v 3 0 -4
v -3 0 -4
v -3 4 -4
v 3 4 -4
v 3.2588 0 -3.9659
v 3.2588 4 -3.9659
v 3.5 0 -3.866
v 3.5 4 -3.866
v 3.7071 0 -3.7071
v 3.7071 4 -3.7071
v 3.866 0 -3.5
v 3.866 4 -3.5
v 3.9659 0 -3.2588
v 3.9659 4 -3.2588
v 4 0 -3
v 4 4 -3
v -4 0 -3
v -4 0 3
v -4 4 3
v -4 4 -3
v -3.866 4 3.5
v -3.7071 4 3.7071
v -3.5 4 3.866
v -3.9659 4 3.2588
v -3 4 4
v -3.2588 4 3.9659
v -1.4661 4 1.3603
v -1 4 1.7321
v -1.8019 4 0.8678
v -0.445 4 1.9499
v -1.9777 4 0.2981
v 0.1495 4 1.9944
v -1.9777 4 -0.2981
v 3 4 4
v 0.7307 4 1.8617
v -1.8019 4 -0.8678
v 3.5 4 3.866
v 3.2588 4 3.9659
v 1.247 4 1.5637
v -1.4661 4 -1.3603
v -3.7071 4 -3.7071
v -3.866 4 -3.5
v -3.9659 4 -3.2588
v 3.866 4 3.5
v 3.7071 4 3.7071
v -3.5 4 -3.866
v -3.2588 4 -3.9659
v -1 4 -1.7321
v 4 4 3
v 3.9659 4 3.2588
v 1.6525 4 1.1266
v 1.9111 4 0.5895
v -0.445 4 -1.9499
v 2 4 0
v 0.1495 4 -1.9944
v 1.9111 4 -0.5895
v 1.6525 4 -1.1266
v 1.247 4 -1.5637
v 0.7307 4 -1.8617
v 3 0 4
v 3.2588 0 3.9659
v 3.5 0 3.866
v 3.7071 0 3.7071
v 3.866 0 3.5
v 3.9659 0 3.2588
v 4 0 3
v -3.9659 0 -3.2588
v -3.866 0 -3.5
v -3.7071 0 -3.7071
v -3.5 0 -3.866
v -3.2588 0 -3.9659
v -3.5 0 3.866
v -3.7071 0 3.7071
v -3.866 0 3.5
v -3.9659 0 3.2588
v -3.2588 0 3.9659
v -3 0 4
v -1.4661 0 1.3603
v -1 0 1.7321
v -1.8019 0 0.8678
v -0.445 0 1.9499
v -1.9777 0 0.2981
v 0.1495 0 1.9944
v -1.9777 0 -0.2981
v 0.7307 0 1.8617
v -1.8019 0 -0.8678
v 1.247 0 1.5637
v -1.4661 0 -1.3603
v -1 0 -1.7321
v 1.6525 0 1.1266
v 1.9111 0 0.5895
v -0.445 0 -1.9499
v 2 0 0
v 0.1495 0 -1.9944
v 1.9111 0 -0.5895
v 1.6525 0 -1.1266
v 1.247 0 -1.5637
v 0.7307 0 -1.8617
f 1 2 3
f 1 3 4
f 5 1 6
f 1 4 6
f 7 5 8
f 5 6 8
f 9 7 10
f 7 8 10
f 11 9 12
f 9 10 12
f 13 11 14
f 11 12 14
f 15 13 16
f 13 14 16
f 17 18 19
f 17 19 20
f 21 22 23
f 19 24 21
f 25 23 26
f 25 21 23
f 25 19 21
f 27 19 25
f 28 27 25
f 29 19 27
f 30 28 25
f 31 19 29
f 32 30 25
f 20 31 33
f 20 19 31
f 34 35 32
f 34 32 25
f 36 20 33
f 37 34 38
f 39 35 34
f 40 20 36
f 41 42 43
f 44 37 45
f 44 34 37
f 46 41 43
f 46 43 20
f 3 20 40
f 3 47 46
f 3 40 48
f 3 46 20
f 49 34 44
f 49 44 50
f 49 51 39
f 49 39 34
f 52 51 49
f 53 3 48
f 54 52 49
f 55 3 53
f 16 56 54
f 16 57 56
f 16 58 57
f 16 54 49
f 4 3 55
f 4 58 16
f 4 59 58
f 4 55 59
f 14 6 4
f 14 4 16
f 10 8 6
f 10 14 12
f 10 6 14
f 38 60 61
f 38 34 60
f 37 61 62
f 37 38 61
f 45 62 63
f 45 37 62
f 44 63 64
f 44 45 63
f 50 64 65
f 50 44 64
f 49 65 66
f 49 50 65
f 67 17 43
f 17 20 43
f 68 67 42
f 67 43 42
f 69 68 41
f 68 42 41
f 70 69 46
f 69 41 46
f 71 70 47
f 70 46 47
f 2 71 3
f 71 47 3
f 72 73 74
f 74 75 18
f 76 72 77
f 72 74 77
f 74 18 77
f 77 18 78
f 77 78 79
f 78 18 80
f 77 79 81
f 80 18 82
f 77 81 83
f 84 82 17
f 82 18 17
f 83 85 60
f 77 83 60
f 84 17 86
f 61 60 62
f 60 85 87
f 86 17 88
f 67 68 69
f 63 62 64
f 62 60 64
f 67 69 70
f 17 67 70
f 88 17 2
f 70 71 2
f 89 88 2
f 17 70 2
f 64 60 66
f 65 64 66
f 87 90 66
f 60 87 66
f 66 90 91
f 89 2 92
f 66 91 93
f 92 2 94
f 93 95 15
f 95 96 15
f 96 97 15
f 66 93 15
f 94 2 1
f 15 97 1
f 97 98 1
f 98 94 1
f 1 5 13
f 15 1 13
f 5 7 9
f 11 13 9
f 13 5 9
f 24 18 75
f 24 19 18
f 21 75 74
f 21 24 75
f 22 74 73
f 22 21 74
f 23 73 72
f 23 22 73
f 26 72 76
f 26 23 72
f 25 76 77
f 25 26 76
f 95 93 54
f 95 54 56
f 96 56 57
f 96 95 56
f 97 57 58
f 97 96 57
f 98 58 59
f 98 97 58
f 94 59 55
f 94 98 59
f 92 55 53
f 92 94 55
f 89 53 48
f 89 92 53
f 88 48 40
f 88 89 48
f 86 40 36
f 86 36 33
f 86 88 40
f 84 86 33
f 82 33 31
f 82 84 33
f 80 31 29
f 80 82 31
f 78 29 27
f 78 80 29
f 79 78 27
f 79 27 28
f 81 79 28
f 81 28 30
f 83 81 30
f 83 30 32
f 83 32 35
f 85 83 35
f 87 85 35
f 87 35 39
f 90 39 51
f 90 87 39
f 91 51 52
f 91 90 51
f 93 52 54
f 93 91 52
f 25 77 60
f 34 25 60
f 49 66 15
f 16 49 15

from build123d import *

# Parameters (mm, degrees)
SKETCH_1_W      = 8
SKETCH_1_H      = 8
SKETCH_1_R      = 2
EXTRUDE_1_DEPTH = 4
FILLET_1_R      = 1


with BuildPart() as part:
    # 草图1 → 凸台-拉伸1 (new body)
    with BuildSketch(Plane(origin=(0, 0, 0), x_dir=(1, 0, 0), z_dir=(0, 1, 0))):
        Rectangle(SKETCH_1_W, SKETCH_1_H)
        Circle(SKETCH_1_R, mode=Mode.SUBTRACT)
    extrude(amount=EXTRUDE_1_DEPTH)

    # 圆角1
    fillet_1_edges = [part.edges().sort_by_distance(p)[0] for p in [
        (4, 2, 4),
        (-4, 2, 4),
        (-4, 2, -4),
        (4, 2, -4),
    ]]
    fillet(fillet_1_edges, radius=FILLET_1_R)


solid = part.part
